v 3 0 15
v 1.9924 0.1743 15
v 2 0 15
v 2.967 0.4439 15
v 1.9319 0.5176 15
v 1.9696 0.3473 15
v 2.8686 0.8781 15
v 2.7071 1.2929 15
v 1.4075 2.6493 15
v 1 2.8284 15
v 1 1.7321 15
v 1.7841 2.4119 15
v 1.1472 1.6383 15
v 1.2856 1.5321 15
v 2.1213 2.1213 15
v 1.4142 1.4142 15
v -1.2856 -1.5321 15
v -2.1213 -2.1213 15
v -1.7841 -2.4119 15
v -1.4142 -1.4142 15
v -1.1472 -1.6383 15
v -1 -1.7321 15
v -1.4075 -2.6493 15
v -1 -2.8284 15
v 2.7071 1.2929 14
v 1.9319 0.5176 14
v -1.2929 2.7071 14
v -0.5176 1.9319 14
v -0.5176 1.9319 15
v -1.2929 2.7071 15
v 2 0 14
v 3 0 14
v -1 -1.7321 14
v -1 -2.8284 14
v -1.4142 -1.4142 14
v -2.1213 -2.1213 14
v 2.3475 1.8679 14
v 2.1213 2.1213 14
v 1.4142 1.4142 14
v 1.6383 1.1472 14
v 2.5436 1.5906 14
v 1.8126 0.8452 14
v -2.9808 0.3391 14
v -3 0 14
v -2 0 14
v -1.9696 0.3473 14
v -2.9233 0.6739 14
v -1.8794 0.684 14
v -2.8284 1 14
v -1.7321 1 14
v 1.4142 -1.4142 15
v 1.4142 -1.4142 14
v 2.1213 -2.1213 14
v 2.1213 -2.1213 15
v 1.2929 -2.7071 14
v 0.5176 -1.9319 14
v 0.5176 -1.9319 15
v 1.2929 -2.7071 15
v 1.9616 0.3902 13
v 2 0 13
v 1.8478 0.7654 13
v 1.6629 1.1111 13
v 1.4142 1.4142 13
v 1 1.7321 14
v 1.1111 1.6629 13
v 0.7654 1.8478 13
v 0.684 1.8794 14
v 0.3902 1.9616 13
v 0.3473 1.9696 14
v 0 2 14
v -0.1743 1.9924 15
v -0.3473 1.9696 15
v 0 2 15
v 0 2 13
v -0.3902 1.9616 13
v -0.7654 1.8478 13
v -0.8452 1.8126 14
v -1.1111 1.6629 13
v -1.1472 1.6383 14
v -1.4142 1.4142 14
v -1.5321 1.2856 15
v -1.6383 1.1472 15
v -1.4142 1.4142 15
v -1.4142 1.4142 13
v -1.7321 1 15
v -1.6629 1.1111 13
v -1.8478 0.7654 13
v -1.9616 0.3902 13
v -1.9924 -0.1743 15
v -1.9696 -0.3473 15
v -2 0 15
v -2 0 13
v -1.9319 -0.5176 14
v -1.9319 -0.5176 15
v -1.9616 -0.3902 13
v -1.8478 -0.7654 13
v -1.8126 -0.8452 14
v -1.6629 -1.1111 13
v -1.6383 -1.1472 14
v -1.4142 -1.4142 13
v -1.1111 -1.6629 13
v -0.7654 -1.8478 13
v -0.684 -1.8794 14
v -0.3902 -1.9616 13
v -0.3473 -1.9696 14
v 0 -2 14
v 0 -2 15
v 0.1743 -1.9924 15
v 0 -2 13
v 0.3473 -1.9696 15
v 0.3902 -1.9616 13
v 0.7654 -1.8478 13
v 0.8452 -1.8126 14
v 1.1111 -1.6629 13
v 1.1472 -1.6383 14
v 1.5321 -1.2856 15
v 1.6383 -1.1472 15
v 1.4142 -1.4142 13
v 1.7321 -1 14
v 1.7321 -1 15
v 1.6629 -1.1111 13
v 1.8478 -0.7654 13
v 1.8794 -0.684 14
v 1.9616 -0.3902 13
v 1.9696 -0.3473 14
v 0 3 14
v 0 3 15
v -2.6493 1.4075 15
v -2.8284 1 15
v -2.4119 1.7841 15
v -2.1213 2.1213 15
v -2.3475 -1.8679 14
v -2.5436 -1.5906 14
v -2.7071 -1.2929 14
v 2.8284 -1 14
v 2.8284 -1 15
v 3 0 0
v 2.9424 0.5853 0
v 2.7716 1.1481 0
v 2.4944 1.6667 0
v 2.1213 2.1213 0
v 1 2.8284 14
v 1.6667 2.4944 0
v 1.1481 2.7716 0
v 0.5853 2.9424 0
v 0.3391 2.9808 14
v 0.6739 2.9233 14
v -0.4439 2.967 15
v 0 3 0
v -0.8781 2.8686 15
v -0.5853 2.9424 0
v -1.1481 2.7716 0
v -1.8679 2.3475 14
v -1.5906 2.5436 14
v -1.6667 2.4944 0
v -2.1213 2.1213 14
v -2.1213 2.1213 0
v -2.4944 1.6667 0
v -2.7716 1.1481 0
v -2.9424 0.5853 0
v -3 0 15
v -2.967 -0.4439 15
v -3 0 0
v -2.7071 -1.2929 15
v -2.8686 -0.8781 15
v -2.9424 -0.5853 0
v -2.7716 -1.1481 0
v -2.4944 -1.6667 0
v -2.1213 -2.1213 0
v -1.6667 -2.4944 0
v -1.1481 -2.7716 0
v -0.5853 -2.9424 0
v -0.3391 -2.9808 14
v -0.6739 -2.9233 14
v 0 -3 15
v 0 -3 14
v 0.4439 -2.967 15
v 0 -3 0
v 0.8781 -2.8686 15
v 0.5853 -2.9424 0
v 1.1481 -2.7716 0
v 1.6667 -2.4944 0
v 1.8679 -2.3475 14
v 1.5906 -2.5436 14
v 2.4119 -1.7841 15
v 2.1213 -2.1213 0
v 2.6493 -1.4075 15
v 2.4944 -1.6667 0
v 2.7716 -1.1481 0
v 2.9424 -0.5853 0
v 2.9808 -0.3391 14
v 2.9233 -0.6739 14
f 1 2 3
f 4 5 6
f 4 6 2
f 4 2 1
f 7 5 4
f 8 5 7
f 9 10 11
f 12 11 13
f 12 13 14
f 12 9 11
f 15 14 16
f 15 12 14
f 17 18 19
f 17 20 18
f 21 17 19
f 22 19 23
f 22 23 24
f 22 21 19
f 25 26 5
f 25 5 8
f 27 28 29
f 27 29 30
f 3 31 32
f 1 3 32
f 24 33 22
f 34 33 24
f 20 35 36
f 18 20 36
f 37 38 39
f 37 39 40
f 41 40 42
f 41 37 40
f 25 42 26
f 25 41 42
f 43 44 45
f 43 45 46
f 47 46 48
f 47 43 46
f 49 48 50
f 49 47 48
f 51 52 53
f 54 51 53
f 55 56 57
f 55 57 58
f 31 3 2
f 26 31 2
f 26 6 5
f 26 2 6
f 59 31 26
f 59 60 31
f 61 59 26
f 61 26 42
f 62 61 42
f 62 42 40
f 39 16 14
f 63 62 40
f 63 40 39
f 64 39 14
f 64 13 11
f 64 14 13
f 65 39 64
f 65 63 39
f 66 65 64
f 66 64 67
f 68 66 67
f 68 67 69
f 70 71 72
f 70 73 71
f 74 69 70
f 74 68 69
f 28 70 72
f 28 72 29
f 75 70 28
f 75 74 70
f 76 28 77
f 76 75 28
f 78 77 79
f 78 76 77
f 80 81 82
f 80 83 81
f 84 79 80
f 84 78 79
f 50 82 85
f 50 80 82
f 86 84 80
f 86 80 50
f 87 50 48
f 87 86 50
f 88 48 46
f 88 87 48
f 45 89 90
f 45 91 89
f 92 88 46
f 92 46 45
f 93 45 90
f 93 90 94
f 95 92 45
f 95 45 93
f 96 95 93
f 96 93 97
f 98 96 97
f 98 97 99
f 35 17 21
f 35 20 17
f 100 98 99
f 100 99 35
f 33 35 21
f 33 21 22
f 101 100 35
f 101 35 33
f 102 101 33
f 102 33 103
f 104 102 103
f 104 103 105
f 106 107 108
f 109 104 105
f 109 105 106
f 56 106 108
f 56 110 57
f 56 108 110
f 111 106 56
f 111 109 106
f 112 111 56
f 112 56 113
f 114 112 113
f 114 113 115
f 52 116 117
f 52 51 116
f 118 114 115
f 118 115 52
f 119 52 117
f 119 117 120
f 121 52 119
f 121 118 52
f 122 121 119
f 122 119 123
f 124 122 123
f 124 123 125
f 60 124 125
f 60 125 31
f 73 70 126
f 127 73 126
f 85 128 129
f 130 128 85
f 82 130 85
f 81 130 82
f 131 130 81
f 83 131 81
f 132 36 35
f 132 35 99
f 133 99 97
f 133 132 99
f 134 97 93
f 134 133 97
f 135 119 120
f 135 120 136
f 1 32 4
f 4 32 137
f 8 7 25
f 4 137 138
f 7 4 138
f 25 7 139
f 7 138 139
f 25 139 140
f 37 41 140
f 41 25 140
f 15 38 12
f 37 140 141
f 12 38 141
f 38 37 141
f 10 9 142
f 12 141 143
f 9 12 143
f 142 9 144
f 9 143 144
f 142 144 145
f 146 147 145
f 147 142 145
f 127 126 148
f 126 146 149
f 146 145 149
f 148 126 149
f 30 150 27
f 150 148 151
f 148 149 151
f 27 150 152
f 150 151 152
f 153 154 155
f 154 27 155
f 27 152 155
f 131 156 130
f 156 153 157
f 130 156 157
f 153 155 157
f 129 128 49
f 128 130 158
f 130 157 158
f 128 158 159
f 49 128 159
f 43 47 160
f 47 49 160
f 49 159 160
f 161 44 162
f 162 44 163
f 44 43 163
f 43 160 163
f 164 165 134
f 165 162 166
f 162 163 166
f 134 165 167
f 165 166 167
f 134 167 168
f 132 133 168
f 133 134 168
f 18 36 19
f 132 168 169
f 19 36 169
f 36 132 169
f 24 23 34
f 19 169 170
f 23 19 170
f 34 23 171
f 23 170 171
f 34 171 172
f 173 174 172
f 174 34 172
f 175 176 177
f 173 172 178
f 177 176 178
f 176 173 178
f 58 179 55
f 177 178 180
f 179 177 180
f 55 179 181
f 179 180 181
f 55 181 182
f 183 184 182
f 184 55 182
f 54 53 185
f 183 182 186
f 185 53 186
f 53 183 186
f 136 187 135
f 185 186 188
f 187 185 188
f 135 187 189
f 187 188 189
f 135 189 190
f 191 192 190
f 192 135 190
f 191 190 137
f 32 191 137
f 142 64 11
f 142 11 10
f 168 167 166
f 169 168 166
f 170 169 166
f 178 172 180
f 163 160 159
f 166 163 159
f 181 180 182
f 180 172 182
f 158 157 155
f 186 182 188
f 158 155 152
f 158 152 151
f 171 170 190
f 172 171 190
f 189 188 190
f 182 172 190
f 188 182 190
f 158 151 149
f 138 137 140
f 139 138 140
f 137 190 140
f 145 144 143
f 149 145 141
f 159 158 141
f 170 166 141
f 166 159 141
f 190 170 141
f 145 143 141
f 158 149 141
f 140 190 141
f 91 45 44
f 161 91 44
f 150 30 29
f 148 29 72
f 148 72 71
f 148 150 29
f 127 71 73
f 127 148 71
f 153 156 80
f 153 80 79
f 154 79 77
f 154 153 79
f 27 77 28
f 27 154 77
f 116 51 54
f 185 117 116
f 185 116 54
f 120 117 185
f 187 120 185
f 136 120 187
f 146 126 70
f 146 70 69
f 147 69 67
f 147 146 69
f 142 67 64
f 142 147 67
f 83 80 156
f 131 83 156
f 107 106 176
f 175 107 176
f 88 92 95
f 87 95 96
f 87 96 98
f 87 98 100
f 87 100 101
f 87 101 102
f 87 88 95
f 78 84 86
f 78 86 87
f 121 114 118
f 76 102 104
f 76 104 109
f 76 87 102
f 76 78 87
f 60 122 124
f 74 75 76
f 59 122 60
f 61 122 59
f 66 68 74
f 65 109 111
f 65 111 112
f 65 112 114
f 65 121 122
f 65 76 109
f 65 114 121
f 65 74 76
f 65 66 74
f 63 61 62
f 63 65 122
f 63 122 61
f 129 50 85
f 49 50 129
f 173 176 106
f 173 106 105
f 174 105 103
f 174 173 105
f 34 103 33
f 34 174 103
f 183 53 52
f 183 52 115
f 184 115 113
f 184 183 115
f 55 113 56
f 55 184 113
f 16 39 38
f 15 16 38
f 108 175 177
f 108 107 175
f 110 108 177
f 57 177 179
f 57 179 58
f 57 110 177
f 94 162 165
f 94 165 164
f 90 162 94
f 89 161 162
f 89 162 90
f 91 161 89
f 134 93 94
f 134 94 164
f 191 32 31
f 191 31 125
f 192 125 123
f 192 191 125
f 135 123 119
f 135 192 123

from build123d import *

# Parameters (mm, degrees)
BOX_W             = 1
BOX_H             = 2
BOX_DEPTH         = 1
ARRAY_COUNT       = 8
CYLINDER001_R     = 2
CYLINDER001_DEPTH = 10
CYLINDER_R        = 3
CYLINDER_DEPTH    = 15


with BuildPart() as array:
    # Box → Box (new body)
    with BuildSketch(Plane(origin=(0, 1, 14), x_dir=(1, 0, 0), z_dir=(0, 0, 1))):
        with Locations((0.5, 1)):
            Rectangle(BOX_W, BOX_H)
    extrude(amount=BOX_DEPTH)

    # Array: Array ×8 about axis
    array_axis = Axis((0, 0, 0), (0, 0, 1))


with BuildPart() as array_1:
    add(array.part)
    for i in range(1, ARRAY_COUNT):
        add(array.part.rotate(array_axis, i * 360 / ARRAY_COUNT))


with BuildPart() as cilindro:
    # Cylinder001 → Cylinder001 (new body)
    with BuildSketch(Plane.XY.offset(13)):
        Circle(CYLINDER001_R)
    extrude(amount=CYLINDER001_DEPTH)


with BuildPart() as cut001:
    # Cylinder → Cylinder (new body)
    with BuildSketch(Plane.XY):
        Circle(CYLINDER_R)
    extrude(amount=CYLINDER_DEPTH)

    # Cut: cut Cilindro
    add(cilindro.part, mode=Mode.SUBTRACT)

    # Cut001: cut Array
    add(array_1.part, mode=Mode.SUBTRACT)


solid = cut001.part
